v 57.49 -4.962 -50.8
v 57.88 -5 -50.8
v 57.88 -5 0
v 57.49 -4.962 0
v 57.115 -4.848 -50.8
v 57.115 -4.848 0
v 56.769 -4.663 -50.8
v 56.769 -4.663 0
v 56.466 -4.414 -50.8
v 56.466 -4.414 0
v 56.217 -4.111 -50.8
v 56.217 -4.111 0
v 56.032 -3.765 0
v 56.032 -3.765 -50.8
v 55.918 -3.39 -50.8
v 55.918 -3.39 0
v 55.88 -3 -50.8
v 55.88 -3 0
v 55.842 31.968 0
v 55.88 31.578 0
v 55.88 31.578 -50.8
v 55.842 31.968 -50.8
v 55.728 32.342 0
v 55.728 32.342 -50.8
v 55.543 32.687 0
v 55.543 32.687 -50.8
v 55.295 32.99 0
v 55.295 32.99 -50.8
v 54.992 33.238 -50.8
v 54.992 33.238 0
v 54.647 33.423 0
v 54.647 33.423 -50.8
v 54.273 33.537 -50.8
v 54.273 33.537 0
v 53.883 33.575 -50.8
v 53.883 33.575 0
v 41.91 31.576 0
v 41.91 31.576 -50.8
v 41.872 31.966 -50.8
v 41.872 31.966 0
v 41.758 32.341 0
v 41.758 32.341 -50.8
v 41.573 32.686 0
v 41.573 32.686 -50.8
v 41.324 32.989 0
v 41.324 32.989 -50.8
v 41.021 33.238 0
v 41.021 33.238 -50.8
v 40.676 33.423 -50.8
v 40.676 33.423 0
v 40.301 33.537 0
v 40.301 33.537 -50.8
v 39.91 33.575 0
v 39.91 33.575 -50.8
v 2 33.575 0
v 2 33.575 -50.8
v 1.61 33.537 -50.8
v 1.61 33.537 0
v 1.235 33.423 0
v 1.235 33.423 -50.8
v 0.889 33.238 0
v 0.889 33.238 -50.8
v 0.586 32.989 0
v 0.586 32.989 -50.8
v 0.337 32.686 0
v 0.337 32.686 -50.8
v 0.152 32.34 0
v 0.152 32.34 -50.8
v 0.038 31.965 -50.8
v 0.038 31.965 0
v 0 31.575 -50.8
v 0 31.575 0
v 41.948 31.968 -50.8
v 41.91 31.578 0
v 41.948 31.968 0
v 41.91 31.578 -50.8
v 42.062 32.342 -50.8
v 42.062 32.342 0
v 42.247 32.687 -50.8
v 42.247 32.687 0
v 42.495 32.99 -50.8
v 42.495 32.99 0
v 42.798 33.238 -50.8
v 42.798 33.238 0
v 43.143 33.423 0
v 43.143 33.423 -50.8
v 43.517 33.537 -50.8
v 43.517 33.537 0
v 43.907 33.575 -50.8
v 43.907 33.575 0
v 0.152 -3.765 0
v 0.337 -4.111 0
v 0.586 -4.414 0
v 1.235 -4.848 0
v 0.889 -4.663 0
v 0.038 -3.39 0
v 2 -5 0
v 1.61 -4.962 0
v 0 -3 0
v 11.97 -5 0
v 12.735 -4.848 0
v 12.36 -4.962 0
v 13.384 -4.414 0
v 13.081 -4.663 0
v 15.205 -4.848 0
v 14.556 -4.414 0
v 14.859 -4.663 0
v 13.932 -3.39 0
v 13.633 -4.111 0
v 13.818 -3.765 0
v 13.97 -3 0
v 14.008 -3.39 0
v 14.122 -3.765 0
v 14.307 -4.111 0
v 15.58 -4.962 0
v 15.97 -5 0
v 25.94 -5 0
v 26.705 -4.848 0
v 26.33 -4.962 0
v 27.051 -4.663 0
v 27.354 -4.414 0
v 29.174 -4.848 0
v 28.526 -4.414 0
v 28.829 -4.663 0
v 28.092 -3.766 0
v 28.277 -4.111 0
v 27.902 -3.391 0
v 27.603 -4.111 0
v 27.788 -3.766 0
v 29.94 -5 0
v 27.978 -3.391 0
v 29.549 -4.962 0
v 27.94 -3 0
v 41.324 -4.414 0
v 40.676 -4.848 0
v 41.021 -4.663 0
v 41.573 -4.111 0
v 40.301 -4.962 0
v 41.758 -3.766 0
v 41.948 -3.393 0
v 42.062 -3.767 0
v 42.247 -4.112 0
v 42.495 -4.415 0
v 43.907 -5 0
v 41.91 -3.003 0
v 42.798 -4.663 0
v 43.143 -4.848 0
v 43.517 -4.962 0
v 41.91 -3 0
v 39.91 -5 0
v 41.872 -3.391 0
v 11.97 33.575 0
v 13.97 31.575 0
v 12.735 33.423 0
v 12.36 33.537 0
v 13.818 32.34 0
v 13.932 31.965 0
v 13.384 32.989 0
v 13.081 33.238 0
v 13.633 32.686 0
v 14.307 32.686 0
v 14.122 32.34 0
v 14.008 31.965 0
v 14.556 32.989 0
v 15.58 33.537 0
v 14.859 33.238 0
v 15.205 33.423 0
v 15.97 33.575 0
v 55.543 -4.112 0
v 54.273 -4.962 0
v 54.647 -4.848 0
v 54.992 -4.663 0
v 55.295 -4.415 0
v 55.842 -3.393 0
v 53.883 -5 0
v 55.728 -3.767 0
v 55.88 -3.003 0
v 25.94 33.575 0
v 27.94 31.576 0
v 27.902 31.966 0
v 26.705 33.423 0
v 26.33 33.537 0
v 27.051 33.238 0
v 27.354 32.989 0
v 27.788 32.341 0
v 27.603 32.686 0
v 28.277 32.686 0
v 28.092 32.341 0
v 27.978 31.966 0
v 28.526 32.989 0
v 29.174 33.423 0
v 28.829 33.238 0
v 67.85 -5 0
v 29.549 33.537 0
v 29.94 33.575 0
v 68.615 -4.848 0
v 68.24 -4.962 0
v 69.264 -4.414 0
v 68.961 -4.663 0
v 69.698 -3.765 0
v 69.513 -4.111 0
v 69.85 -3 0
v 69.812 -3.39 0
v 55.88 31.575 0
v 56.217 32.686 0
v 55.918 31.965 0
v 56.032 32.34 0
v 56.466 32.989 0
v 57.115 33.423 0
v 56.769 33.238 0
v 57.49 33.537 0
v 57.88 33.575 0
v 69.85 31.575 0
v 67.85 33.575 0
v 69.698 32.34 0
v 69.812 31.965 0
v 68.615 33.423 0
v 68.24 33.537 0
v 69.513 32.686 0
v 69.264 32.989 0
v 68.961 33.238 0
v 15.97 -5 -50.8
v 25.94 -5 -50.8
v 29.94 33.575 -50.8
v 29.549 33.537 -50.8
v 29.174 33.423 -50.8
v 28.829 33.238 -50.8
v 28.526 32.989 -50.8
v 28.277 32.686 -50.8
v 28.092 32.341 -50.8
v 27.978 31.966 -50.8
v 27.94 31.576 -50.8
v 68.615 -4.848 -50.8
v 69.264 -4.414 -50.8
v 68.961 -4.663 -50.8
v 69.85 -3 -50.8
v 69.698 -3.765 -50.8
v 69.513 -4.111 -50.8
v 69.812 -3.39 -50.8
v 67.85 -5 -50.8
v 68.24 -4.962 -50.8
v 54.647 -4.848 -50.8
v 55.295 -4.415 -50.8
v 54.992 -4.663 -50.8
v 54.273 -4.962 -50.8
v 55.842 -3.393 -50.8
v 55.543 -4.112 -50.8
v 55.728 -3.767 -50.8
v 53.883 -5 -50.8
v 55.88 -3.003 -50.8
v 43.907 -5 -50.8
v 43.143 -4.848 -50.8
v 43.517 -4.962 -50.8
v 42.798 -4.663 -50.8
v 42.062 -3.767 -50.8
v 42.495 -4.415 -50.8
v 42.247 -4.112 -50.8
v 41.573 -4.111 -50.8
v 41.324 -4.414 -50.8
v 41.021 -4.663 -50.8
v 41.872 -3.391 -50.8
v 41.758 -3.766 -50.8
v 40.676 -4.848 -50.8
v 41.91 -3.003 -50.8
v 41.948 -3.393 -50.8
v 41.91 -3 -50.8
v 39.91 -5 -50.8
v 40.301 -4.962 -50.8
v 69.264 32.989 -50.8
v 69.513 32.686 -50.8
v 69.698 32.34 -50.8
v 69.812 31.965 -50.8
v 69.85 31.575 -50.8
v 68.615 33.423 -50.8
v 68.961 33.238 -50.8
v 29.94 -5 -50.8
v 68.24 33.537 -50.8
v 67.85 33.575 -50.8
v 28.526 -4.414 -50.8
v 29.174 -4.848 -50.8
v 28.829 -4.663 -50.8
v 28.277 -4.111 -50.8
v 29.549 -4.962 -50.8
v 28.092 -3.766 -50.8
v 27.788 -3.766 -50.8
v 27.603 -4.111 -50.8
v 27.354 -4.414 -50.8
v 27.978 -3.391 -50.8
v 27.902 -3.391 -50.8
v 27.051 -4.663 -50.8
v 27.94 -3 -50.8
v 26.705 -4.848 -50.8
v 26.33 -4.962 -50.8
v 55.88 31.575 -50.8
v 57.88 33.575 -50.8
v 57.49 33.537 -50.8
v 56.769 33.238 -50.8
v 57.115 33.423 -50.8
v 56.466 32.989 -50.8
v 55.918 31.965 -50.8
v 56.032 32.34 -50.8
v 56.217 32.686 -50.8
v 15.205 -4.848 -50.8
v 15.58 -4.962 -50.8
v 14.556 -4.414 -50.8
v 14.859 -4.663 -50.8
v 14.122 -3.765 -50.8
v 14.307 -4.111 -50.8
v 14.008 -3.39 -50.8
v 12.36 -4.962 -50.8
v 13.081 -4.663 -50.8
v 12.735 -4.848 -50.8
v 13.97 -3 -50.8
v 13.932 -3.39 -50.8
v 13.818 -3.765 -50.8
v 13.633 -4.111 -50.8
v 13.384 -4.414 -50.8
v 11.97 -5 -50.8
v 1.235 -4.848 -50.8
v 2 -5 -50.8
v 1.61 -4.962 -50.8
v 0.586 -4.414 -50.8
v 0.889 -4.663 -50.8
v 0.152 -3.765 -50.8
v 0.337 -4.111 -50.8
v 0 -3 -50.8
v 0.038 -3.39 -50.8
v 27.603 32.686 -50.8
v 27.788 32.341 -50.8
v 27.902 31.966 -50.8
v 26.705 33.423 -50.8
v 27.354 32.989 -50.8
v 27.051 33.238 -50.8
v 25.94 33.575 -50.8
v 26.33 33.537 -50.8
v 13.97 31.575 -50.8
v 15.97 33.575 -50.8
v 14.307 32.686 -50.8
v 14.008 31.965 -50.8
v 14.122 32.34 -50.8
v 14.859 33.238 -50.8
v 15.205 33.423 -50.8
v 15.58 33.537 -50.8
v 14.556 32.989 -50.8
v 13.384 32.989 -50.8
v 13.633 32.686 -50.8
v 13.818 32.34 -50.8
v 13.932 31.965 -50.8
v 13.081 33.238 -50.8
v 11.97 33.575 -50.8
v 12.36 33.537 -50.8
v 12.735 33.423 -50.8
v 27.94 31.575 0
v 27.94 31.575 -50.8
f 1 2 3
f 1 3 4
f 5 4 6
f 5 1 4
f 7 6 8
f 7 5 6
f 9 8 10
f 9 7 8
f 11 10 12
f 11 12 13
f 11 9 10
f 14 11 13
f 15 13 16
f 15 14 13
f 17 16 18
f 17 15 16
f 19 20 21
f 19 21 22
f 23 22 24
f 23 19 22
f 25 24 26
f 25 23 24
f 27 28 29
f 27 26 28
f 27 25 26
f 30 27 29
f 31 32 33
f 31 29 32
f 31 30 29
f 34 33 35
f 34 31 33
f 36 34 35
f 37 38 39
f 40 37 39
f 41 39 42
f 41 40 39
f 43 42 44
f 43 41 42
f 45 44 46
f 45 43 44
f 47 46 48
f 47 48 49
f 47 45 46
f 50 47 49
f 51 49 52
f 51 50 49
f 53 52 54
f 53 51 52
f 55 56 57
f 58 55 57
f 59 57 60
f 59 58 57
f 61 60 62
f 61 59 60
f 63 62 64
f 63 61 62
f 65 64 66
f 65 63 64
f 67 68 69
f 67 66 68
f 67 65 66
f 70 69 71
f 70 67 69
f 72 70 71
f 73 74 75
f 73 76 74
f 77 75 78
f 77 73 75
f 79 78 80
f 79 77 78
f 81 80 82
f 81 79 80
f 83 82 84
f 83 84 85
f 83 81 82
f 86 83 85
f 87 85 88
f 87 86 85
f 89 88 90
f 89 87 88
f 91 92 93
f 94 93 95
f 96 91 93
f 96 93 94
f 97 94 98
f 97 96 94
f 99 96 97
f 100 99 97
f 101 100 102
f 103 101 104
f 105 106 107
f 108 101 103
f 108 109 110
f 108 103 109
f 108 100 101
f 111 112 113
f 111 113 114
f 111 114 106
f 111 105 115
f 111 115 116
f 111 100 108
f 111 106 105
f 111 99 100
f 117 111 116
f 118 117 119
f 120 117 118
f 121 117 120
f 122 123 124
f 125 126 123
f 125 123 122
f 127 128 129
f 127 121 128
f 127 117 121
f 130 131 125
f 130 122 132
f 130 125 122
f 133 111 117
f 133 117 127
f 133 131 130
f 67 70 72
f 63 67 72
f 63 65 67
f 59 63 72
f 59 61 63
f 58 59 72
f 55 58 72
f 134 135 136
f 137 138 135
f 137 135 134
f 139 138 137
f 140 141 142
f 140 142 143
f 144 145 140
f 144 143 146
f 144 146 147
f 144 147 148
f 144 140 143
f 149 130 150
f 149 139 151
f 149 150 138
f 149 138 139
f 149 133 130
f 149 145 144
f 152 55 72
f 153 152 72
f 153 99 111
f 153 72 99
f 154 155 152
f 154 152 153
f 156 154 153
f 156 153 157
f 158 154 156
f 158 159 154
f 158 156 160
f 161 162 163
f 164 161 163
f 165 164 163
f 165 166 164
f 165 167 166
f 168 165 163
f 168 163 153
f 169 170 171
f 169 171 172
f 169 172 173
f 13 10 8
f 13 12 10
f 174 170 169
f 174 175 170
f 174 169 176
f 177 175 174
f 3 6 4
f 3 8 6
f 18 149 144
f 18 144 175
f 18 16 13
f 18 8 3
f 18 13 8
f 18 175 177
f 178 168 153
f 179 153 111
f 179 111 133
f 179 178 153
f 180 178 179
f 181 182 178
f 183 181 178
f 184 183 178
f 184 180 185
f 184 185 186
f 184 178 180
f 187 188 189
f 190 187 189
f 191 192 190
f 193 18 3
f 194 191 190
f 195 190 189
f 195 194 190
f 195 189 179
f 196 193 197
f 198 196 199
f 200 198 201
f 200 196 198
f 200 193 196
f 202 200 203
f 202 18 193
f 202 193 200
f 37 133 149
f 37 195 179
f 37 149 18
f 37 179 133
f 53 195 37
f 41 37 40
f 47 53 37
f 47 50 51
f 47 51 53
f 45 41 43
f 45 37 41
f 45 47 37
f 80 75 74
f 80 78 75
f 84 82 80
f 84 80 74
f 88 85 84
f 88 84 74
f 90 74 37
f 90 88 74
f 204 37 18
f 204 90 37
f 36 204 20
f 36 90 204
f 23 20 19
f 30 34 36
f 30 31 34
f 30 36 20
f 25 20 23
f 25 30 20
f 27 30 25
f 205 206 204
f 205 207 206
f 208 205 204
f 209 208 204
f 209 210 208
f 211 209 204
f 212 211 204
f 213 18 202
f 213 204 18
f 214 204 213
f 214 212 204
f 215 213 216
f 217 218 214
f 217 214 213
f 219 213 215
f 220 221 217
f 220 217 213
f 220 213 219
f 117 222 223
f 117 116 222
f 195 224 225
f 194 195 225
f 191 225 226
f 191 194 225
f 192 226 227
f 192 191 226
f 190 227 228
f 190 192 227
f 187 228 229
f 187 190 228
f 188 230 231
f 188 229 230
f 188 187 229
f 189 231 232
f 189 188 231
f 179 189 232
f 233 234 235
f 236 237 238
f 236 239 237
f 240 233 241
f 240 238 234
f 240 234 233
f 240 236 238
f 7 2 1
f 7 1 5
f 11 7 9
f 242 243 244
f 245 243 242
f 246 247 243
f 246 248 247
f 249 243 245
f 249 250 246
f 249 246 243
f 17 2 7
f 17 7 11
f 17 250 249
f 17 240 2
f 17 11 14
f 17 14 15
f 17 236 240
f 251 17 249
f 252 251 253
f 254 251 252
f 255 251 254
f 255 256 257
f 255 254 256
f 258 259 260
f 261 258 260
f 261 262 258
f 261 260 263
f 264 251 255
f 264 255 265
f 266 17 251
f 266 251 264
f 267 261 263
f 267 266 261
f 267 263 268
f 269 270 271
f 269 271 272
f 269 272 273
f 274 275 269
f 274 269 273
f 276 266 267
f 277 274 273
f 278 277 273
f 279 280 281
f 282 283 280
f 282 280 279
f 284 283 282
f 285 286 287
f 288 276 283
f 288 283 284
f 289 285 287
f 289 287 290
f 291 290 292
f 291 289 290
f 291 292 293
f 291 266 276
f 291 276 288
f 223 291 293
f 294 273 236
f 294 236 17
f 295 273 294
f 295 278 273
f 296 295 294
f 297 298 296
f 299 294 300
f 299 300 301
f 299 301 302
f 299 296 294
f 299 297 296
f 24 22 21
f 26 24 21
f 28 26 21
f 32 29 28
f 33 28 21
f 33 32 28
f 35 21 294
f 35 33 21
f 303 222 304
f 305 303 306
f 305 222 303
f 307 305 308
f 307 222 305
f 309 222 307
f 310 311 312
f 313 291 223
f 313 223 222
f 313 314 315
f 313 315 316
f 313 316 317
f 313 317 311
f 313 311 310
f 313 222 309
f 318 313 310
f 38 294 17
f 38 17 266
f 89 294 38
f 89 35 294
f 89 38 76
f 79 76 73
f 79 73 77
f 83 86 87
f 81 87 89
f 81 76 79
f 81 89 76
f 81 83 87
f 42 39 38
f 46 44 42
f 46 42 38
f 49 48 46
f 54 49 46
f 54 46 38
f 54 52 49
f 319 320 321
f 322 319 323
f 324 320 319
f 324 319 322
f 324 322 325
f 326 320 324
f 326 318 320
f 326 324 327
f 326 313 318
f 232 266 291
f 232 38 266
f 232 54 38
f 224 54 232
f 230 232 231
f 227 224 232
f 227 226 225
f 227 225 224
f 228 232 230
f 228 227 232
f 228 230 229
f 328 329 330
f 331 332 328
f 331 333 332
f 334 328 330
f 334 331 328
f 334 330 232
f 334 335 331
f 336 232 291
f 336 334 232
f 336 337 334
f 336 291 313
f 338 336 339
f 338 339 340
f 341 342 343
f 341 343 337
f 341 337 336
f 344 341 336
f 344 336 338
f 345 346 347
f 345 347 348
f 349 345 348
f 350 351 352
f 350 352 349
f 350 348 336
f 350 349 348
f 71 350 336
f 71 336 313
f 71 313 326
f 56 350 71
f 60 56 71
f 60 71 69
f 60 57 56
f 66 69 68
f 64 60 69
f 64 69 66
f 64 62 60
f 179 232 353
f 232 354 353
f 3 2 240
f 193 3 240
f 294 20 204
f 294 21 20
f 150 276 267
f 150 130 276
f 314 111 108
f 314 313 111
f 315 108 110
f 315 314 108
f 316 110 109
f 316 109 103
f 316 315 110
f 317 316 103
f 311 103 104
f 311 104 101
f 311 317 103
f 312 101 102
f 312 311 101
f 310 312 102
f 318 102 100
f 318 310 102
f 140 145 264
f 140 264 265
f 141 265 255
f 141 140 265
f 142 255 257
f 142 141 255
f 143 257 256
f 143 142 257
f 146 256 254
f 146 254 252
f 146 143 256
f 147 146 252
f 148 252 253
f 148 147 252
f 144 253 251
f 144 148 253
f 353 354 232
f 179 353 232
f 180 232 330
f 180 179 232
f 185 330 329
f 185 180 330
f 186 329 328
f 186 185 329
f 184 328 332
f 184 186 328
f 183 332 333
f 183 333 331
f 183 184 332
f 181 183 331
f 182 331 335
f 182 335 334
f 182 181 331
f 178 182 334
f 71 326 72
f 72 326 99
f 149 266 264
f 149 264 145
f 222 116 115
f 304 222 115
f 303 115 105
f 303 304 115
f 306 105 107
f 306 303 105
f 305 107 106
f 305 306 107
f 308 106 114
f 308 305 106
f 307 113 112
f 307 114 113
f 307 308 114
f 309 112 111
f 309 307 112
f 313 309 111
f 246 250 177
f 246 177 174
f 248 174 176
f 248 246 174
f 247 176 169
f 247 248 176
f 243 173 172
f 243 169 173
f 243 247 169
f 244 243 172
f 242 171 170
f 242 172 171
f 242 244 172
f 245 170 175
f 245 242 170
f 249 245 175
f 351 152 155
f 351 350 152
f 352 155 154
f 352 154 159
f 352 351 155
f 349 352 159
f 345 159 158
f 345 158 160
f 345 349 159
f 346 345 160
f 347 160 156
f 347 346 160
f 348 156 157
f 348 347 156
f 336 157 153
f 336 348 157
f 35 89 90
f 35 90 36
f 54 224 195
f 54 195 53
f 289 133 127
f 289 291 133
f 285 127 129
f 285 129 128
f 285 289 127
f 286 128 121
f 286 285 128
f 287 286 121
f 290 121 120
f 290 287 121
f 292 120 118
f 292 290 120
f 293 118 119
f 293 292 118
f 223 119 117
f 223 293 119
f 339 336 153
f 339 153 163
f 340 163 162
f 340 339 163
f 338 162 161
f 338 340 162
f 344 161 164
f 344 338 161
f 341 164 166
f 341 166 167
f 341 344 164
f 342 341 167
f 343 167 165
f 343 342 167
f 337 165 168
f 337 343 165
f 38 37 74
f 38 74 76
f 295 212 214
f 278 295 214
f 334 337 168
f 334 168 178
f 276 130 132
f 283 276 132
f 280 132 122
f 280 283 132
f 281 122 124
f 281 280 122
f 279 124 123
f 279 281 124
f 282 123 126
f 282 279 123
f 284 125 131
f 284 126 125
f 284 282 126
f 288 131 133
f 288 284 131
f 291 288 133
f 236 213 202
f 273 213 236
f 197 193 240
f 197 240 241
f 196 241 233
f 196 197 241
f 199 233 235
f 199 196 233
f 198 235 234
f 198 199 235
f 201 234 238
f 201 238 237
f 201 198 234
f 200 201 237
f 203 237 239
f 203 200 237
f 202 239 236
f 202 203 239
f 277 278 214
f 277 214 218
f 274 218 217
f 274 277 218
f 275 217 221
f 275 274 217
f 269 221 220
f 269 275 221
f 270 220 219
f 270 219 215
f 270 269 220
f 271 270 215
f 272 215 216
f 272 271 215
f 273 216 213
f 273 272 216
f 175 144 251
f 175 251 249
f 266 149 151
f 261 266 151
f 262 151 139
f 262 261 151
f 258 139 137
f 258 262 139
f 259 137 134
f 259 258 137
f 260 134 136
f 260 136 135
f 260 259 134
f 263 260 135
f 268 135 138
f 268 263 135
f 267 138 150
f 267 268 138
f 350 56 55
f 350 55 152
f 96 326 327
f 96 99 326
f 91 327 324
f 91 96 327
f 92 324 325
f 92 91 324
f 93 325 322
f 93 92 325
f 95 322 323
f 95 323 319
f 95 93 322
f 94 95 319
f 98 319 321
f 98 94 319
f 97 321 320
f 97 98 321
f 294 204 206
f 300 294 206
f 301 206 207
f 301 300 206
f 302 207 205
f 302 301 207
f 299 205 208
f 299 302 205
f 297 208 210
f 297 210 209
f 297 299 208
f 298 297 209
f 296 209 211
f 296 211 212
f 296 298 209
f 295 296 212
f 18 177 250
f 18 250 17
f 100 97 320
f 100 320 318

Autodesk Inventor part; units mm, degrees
ref_plane "YZ Plane" through (0, 0, 0) normal (1, 0, 0) x (0, 1, 0)
ref_plane "XZ Plane" through (0, 0, 0) normal (0, 1, 0) x (-1, 0, 0)
ref_plane "XY Plane" through (0, 0, 0) normal (0, 0, 1) x (1, 0, 0)
sketch "Sketch1" plane through (0, 0, 0) normal (0, 1, 0) x (-1, 0, 0)
  line L0 (0, 0) -> (-69.85, 0)
  line L1 (-69.85, 0) -> (-69.85, -50.8)
  line L2 (-69.85, -50.8) -> (0, -50.8)
  line L3 (0, -50.8) -> (0, 0)
  dimension "d0" = 50.8
  dimension "d1" = 69.85
extrude "Extrusion1" add sketch "Sketch1" along normal blind 28.575
sketch "Sketch2" plane through (0, 28.575, 0) normal (0, 1, 0) x (1, 0, 0)
  line L0 (0, 0) -> (69.85, 0) projected
  line L1 (13.97, 0) -> (13.97, 50.8)
  line L2 (69.85, 50.8) -> (0, 50.8) projected
  line L3 (27.94, 50.8) -> (27.94, 0)
  line L4 (55.88, 50.8) -> (55.88, 0)
  line L5 (41.91, 50.8) -> (41.91, 0)
  line L6 (0, 50.8) -> (0, 0) projected
  dimension "d4" = 13.97
  dimension "d5" = 13.97
  dimension "d6" = 13.97
  dimension "d7" = 13.97
sketch "Sketch3" plane through (0, 28.575, 0) normal (0, 1, 0) x (1, 0, 0)
  line L0 (69.85, 50.8) -> (0, 50.8) projected
  line L1 (0, 0) -> (69.85, 0) projected
  line L2 (0, 50.8) -> (13.97, 50.8)
  line L3 (13.97, 50.8) -> (13.97, 0)
  line L4 (13.97, 0) -> (0, 0)
  line L5 (0, 0) -> (0, 50.8)
  dimension "d8" = 50.8
  dimension "d9" = 13.97
extrude "Extrusion2" add sketch "Sketch2" along normal blind 5 contours L6 L2 L1 L0
sketch "Sketch4" plane through (0, 0, -50.8) normal (-1, 0, 0) x (0, 0, 1)
  line L0 (0, 0) -> (0, 33.575) projected
  line L1 (50.8, 0) -> (50.8, 33.575) projected
  line L2 (0, 33.575) -> (50.8, 33.575)
  line L3 (50.8, 33.575) -> (50.8, 28.5663)
  line L4 (50.8, 28.5663) -> (0, 28.5663)
  line L5 (0, 28.5663) -> (0, 33.575)
fillet "Fillet1" radius 2 2 edges at (0, 33.575, -25.4) (13.97, 33.575, -25.4)
sketch "Sketch5" plane through (0, 28.575, 0) normal (0, 1, 0) x (1, 0, 0)
  line L0 (13.97, 50.8) -> (27.94, 50.8)
  line L1 (27.94, 50.8) -> (27.94, 0)
  line L2 (27.94, 0) -> (13.97, 0)
  line L3 (13.97, 0) -> (13.97, 50.8)
  point P0 (0, 0)
  dimension "d13" = 13.97
extrude "Extrusion3" add sketch "Sketch5" along normal blind 5
fillet "Fillet2" radius 2 2 edges at (13.97, 33.575, -25.4) (27.94, 33.575, -25.4)
sketch "Sketch6" plane through (0, 28.575, 0) normal (0, 1, 0) x (1, 0, 0)
  line L0 (27.94, 50.8) -> (27.94, 0) projected
  line L1 (27.94, 50.8) -> (41.91, 50.8)
  line L2 (41.91, 50.8) -> (41.91, 0)
  line L3 (41.91, 0) -> (27.94, 0)
  line L4 (27.94, 0) -> (27.94, 50.8)
  point P0 (0, 0)
  dimension "d17" = 13.97
extrude "Extrusion4" add sketch "Sketch6" along normal blind 5
fillet "Fillet3" radius 2 2 edges at (27.94, 33.575, -25.4) (41.91, 33.575, -25.4)
sketch "Sketch7" plane through (0, 28.575, 0) normal (0, 1, 0) x (1, 0, 0)
  line L0 (41.91, 0) -> (41.91, 50.8) projected
  line L1 (41.91, 0) -> (69.85, 0) projected
  line L2 (41.91, 50.8) -> (55.88, 50.8)
  line L3 (55.88, 50.8) -> (55.88, 0)
  line L4 (55.88, 0) -> (41.91, 0)
  line L5 (41.91, 0) -> (41.91, 50.8)
  point P0 (0, 0)
extrude "Extrusion5" add sketch "Sketch7" along normal blind 5
fillet "Fillet4" radius 2 2 edges at (41.91, 33.575, -25.4) (55.88, 33.575, -25.4)
sketch "Sketch8" plane through (0, 28.575, 0) normal (0, 1, 0) x (1, 0, 0)
  line L0 (55.88, 50.8) -> (55.88, 0) projected
  line L1 (55.88, 0) -> (69.85, 0) projected
  line L2 (55.88, 50.8) -> (69.85, 50.8)
  line L3 (69.85, 50.8) -> (69.85, 0)
  line L4 (69.85, 0) -> (55.88, 0)
  line L5 (55.88, 0) -> (55.88, 50.8)
  point P0 (0, 0)
extrude "Extrusion6" add sketch "Sketch8" along normal blind 5
fillet "Fillet5" radius 2 2 edges at (55.88, 33.575, -25.4) (69.85, 33.575, -25.4)
sketch "Sketch9" plane through (0, 0, 0) normal (0, -1, 0) x (1, 0, 0)
  point P0 (0, 0)
sketch "Sketch10" plane through (0, 0, 0) normal (0, -1, 0) x (1, 0, 0)
  line L0 (69.85, -50.8) -> (0, -50.8) projected
  line L1 (0, 0) -> (13.97, 0)
  line L2 (13.97, 0) -> (13.97, -50.8)
  line L3 (13.97, -50.8) -> (0, -50.8)
  line L4 (0, -50.8) -> (0, 0)
  dimension "d27" = 13.97
extrude "Extrusion7" add sketch "Sketch10" along normal blind 5
fillet "Fillet6" radius 2 2 edges at (0, -5, -25.4) (13.97, -5, -25.4)
sketch "Sketch11" plane through (0, 0, 0) normal (0, -1, 0) x (1, 0, 0)
  line L0 (13.97, 0) -> (13.97, -50.8) projected
  line L1 (27.94, -50.8) -> (25.94, -50.8) projected
  line L2 (13.97, 0) -> (27.94, 0)
  line L3 (27.94, 0) -> (27.94, -50.8)
  line L4 (27.94, -50.8) -> (13.97, -50.8)
  line L5 (13.97, -50.8) -> (13.97, 0)
  point P0 (0, 0)
extrude "Extrusion8" add sketch "Sketch11" along normal blind 5
fillet "Fillet7" radius 2 2 edges at (13.97, -5, -25.4) (27.94, -5, -25.4)
sketch "Sketch12" plane through (0, 0, 0) normal (0, -1, 0) x (1, 0, 0)
  line L0 (27.94, 0) -> (27.94, -50.8) projected
  line L1 (41.91, 0) -> (41.91, -50.8) projected
  line L2 (27.94, 0) -> (41.91, 0)
  line L3 (41.91, 0) -> (41.91, -50.8)
  line L4 (41.91, -50.8) -> (27.94, -50.8)
  line L5 (27.94, -50.8) -> (27.94, 0)
  point P0 (0, 0)
extrude "Extrusion9" add sketch "Sketch12" along normal blind 5
fillet "Fillet8" radius 2 2 edges at (27.94, -5, -25.4) (41.91, -5, -25.4)
sketch "Sketch13" plane through (0, 0, 0) normal (0, -1, 0) x (1, 0, 0)
  line L0 (41.91, -50.8) -> (41.91, 0) projected
  line L1 (69.85, -50.8) -> (41.91, -50.8) projected
  line L2 (41.91, 0) -> (55.88, 0)
  line L3 (55.88, 0) -> (55.88, -50.8)
  line L4 (55.88, -50.8) -> (41.91, -50.8)
  line L5 (41.91, -50.8) -> (41.91, 0)
  point P0 (0, 0)
extrude "Extrusion10" add sketch "Sketch13" along normal blind 5
fillet "Fillet9" radius 2 2 edges at (55.88, -5, -25.4) (41.91, -5, -25.4)
sketch "Sketch14" plane through (0, 0, 0) normal (0, -1, 0) x (1, 0, 0)
  line L0 (53.88, 0) -> (55.88, 0) projected
  line L1 (69.85, -50.8) -> (55.88, -50.8) projected
  line L2 (55.88, 0) -> (69.85, 0)
  line L3 (69.85, 0) -> (69.85, -50.8)
  line L4 (69.85, -50.8) -> (55.88, -50.8)
  line L5 (55.88, -50.8) -> (55.88, 0)
  point P0 (0, 0)
extrude "Extrusion11" add sketch "Sketch14" along normal blind 5
fillet "Fillet10" radius 2 2 edges at (55.88, -5, -25.4) (69.85, -5, -25.4)
properties part number "Simplistic_battery_pack-spencermical"
